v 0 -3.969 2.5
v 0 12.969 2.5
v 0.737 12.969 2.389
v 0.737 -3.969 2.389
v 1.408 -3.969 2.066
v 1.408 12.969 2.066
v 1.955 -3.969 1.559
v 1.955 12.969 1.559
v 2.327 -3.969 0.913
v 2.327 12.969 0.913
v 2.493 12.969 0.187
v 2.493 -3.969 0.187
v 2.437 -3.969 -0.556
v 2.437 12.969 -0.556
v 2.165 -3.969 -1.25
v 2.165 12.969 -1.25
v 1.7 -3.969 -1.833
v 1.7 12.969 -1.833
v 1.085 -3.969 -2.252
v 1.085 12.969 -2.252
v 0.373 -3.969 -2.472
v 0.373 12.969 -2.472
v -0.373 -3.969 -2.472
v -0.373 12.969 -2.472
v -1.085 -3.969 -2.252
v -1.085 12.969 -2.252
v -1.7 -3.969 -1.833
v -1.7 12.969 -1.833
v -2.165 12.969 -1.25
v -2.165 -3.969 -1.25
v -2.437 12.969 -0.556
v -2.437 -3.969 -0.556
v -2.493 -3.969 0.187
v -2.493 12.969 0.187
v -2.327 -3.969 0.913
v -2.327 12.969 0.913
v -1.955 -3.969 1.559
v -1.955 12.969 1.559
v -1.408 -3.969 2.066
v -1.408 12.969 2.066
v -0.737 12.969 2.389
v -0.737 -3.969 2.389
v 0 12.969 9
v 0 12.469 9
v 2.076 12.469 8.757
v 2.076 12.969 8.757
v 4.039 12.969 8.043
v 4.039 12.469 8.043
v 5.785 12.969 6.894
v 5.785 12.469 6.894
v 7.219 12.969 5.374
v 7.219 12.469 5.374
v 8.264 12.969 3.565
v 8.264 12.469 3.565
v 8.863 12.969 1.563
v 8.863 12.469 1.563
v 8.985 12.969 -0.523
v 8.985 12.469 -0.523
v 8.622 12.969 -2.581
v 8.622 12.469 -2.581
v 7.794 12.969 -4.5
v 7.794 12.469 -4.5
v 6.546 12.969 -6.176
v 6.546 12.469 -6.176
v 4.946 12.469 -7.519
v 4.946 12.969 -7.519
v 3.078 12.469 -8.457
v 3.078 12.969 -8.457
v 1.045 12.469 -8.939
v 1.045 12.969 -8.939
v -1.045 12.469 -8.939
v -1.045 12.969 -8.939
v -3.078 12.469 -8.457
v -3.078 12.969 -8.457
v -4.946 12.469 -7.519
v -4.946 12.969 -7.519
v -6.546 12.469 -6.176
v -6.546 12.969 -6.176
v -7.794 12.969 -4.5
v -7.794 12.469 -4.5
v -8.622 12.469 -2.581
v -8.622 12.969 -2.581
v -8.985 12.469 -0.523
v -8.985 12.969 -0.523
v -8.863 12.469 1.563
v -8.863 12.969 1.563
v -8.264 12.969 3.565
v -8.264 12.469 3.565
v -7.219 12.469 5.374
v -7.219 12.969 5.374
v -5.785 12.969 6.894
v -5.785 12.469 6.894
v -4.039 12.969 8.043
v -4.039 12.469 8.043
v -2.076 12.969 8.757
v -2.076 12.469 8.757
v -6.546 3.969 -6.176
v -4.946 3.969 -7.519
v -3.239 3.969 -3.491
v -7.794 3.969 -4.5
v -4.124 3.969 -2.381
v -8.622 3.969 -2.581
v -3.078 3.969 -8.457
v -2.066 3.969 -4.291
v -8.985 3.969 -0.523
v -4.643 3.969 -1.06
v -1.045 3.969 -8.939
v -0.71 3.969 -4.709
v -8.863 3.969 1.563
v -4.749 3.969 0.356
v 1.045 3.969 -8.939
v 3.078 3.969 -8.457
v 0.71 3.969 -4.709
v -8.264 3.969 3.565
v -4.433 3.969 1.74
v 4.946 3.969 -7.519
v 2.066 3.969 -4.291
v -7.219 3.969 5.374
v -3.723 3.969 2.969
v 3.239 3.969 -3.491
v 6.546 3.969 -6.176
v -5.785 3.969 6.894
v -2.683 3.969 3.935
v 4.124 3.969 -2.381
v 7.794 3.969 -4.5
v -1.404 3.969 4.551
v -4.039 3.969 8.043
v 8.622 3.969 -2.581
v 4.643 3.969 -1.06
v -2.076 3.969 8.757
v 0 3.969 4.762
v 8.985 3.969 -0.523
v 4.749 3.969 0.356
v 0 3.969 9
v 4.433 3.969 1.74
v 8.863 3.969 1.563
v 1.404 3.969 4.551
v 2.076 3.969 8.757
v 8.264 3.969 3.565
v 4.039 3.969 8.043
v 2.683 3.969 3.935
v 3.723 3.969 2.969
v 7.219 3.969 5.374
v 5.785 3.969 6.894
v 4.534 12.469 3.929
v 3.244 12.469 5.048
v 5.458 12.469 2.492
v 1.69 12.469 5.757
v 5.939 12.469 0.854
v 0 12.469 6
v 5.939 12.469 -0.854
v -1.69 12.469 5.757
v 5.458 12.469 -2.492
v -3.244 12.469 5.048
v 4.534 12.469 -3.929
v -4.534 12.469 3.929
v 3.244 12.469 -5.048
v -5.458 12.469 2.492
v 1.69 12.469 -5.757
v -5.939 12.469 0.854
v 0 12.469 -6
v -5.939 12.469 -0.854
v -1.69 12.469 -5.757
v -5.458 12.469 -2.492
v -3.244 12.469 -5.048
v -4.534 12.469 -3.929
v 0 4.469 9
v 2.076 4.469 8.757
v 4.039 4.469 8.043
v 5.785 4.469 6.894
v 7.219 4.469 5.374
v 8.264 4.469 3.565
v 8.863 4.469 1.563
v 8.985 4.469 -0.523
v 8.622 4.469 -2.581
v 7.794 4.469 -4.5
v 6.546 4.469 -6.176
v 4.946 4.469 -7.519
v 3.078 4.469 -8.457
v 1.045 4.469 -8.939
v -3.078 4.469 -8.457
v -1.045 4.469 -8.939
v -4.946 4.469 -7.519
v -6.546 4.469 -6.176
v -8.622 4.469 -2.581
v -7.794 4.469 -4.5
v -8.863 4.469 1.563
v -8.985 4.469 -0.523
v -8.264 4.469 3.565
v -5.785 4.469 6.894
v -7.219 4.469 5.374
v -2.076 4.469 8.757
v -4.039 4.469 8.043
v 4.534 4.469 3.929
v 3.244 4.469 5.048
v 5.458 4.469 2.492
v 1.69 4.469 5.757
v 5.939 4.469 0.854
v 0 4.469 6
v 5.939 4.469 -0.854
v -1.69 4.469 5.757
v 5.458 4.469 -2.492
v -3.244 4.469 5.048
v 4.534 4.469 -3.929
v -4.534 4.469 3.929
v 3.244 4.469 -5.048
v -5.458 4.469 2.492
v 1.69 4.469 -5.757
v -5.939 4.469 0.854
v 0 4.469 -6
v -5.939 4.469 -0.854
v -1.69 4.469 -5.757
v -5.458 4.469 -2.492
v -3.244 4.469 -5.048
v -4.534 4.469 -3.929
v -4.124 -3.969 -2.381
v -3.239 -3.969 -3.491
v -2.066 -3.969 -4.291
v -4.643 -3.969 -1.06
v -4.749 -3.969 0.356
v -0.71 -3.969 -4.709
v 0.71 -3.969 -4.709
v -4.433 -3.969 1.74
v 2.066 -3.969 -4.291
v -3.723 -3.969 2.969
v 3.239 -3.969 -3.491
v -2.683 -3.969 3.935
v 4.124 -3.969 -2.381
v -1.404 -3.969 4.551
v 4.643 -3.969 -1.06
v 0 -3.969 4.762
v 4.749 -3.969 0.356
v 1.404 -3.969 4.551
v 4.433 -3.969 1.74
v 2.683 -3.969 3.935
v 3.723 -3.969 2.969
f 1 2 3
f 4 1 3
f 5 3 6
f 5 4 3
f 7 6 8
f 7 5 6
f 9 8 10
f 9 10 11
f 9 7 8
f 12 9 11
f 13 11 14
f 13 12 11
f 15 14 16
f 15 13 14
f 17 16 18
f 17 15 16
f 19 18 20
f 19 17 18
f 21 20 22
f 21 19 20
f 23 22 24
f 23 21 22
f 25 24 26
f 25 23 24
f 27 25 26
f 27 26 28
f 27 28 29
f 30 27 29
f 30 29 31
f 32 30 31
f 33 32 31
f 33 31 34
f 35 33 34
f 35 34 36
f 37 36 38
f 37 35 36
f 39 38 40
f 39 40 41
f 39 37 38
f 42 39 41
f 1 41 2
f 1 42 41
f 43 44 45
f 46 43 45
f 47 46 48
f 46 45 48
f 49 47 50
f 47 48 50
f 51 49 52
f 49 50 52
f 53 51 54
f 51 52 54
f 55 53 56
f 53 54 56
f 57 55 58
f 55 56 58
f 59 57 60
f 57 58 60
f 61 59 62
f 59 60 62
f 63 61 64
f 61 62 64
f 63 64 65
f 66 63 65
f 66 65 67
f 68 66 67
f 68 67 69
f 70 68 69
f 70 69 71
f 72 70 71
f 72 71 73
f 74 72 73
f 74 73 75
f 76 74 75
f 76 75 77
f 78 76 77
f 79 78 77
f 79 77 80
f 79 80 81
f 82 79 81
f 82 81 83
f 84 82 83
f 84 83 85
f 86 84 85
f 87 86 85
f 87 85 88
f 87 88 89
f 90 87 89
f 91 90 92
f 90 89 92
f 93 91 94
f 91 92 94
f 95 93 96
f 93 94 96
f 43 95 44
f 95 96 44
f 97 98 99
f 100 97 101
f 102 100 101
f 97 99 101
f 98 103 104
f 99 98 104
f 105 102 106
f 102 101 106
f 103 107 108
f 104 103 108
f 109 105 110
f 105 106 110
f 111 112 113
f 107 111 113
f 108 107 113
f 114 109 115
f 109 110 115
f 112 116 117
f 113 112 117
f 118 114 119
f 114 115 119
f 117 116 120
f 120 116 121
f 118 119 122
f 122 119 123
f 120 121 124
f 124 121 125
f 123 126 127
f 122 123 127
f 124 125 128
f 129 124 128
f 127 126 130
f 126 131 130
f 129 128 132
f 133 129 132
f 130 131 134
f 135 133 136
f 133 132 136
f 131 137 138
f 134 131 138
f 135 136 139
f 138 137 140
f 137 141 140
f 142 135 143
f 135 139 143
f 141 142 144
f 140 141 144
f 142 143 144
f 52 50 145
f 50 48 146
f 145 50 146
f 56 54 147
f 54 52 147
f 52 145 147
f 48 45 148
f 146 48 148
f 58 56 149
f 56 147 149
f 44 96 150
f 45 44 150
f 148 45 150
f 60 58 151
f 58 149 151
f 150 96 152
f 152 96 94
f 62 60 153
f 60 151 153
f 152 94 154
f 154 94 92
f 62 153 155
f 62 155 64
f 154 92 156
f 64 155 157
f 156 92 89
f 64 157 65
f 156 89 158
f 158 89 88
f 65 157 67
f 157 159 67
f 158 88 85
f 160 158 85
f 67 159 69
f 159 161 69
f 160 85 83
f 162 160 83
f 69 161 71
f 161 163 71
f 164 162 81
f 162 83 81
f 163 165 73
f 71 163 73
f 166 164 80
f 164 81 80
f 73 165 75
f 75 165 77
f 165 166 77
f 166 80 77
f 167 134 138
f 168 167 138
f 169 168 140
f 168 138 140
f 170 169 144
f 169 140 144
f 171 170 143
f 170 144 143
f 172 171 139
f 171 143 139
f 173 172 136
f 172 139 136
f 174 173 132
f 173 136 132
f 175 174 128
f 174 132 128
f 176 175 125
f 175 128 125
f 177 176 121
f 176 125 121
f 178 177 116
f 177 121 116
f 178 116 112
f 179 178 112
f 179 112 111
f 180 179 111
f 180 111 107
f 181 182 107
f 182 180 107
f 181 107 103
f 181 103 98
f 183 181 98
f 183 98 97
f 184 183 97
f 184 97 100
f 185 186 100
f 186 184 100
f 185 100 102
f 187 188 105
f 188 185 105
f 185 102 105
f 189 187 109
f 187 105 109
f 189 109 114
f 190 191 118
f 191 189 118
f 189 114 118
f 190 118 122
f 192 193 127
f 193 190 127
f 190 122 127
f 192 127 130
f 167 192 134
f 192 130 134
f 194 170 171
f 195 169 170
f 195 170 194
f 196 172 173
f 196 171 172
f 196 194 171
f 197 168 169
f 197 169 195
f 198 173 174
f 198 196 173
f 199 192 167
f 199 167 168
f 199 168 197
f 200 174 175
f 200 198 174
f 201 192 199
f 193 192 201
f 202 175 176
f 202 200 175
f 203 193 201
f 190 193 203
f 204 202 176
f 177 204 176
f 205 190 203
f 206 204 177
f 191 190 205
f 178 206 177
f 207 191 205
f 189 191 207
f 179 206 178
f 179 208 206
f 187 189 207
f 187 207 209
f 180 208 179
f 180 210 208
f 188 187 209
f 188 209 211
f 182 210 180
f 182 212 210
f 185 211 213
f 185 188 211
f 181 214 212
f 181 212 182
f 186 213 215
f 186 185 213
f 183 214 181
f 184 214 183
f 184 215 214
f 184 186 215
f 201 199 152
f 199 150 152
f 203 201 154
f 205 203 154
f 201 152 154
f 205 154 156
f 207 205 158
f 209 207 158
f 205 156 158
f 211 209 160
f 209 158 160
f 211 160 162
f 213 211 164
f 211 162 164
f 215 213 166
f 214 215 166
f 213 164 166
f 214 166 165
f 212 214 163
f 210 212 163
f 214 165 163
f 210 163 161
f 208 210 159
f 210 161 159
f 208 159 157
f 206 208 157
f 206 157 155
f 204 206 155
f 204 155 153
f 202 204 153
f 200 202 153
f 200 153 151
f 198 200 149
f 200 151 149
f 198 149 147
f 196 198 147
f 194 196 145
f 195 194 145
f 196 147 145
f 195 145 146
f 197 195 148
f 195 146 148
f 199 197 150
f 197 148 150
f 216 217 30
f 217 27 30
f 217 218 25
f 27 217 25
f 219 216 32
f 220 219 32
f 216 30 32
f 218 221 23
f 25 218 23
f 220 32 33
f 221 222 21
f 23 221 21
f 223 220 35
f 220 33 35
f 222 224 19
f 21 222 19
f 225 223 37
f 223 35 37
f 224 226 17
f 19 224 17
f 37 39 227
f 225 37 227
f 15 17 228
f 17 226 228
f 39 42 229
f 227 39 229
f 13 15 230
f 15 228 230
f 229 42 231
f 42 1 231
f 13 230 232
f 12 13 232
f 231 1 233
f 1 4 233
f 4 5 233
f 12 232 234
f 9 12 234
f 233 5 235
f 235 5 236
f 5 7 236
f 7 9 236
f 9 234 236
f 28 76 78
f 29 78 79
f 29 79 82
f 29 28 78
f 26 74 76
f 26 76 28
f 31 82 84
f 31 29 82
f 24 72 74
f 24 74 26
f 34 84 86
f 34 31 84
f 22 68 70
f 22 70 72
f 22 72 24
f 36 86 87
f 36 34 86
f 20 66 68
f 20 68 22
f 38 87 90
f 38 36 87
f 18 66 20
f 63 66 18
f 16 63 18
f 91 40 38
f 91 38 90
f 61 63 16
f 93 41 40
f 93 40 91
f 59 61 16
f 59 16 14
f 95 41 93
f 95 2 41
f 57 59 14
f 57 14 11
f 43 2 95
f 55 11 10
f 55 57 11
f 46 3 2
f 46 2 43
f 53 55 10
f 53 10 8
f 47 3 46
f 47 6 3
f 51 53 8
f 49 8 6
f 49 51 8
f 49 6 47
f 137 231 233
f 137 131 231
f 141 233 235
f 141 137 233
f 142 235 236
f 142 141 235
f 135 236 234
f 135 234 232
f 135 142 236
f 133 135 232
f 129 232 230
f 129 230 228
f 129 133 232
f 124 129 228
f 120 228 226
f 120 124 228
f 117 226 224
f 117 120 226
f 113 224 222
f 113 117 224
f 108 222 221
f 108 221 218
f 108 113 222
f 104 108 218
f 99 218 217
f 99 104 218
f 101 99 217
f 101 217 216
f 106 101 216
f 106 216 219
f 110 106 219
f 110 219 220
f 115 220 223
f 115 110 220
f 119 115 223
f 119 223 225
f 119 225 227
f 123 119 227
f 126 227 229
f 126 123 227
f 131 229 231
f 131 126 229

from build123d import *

# Parameters (mm, degrees)
SKETCH1_R           = 4.7625
SKETCH1_R_2         = 2.5
BOSS_EXTRUDE1_DEPTH = 3.96875
SKETCH2_R           = 9
SKETCH2_R_2         = 2.5
BOSS_EXTRUDE2_DEPTH = 9
SKETCH3_W           = 3
SKETCH3_H           = 8


with BuildPart() as part:
    # Sketch1 → Boss-Extrude1 (new, symmetric)
    with BuildSketch(Plane(origin=(0, 0, 0), x_dir=(1, 0, 0), z_dir=(0, 1, 0))):
        with Locations(Location((0, 0, 0), (0, 0, 270))):
            Circle(SKETCH1_R)
        with Locations(Location((0, 0, 0), (0, 0, 270))):
            Circle(SKETCH1_R_2, mode=Mode.SUBTRACT)
    extrude(amount=BOSS_EXTRUDE1_DEPTH, both=True)

    # Sketch2 → Boss-Extrude2 (add)
    with BuildSketch(Plane(origin=(0, 3.96875, 0), x_dir=(1, 0, 0), z_dir=(0, 1, 0))):
        with Locations(Location((0, 0, 0), (0, 0, 270))):
            Circle(SKETCH2_R)
        with Locations(Location((0, 0, 0), (0, 0, 270))):
            Circle(SKETCH2_R_2, mode=Mode.SUBTRACT)
    extrude(amount=BOSS_EXTRUDE2_DEPTH)

    # Sketch3 → Cut-Revolve1 (revolve, cut)
    with BuildSketch(Plane(origin=(0, 0, 0), x_dir=(0, 0, -1), z_dir=(1, 0, 0)), mode=Mode.PRIVATE) as cut_revolve1_sk:
        with Locations((7.5, 8.46875)):
            Rectangle(SKETCH3_W, SKETCH3_H)
    revolve(cut_revolve1_sk.sketch.rotate(Axis((0, 3.96875, 0), (0, -1, 0)), 180), axis=Axis((0, 3.96875, 0), (0, -1, 0)), mode=Mode.SUBTRACT)


solid = part.part
